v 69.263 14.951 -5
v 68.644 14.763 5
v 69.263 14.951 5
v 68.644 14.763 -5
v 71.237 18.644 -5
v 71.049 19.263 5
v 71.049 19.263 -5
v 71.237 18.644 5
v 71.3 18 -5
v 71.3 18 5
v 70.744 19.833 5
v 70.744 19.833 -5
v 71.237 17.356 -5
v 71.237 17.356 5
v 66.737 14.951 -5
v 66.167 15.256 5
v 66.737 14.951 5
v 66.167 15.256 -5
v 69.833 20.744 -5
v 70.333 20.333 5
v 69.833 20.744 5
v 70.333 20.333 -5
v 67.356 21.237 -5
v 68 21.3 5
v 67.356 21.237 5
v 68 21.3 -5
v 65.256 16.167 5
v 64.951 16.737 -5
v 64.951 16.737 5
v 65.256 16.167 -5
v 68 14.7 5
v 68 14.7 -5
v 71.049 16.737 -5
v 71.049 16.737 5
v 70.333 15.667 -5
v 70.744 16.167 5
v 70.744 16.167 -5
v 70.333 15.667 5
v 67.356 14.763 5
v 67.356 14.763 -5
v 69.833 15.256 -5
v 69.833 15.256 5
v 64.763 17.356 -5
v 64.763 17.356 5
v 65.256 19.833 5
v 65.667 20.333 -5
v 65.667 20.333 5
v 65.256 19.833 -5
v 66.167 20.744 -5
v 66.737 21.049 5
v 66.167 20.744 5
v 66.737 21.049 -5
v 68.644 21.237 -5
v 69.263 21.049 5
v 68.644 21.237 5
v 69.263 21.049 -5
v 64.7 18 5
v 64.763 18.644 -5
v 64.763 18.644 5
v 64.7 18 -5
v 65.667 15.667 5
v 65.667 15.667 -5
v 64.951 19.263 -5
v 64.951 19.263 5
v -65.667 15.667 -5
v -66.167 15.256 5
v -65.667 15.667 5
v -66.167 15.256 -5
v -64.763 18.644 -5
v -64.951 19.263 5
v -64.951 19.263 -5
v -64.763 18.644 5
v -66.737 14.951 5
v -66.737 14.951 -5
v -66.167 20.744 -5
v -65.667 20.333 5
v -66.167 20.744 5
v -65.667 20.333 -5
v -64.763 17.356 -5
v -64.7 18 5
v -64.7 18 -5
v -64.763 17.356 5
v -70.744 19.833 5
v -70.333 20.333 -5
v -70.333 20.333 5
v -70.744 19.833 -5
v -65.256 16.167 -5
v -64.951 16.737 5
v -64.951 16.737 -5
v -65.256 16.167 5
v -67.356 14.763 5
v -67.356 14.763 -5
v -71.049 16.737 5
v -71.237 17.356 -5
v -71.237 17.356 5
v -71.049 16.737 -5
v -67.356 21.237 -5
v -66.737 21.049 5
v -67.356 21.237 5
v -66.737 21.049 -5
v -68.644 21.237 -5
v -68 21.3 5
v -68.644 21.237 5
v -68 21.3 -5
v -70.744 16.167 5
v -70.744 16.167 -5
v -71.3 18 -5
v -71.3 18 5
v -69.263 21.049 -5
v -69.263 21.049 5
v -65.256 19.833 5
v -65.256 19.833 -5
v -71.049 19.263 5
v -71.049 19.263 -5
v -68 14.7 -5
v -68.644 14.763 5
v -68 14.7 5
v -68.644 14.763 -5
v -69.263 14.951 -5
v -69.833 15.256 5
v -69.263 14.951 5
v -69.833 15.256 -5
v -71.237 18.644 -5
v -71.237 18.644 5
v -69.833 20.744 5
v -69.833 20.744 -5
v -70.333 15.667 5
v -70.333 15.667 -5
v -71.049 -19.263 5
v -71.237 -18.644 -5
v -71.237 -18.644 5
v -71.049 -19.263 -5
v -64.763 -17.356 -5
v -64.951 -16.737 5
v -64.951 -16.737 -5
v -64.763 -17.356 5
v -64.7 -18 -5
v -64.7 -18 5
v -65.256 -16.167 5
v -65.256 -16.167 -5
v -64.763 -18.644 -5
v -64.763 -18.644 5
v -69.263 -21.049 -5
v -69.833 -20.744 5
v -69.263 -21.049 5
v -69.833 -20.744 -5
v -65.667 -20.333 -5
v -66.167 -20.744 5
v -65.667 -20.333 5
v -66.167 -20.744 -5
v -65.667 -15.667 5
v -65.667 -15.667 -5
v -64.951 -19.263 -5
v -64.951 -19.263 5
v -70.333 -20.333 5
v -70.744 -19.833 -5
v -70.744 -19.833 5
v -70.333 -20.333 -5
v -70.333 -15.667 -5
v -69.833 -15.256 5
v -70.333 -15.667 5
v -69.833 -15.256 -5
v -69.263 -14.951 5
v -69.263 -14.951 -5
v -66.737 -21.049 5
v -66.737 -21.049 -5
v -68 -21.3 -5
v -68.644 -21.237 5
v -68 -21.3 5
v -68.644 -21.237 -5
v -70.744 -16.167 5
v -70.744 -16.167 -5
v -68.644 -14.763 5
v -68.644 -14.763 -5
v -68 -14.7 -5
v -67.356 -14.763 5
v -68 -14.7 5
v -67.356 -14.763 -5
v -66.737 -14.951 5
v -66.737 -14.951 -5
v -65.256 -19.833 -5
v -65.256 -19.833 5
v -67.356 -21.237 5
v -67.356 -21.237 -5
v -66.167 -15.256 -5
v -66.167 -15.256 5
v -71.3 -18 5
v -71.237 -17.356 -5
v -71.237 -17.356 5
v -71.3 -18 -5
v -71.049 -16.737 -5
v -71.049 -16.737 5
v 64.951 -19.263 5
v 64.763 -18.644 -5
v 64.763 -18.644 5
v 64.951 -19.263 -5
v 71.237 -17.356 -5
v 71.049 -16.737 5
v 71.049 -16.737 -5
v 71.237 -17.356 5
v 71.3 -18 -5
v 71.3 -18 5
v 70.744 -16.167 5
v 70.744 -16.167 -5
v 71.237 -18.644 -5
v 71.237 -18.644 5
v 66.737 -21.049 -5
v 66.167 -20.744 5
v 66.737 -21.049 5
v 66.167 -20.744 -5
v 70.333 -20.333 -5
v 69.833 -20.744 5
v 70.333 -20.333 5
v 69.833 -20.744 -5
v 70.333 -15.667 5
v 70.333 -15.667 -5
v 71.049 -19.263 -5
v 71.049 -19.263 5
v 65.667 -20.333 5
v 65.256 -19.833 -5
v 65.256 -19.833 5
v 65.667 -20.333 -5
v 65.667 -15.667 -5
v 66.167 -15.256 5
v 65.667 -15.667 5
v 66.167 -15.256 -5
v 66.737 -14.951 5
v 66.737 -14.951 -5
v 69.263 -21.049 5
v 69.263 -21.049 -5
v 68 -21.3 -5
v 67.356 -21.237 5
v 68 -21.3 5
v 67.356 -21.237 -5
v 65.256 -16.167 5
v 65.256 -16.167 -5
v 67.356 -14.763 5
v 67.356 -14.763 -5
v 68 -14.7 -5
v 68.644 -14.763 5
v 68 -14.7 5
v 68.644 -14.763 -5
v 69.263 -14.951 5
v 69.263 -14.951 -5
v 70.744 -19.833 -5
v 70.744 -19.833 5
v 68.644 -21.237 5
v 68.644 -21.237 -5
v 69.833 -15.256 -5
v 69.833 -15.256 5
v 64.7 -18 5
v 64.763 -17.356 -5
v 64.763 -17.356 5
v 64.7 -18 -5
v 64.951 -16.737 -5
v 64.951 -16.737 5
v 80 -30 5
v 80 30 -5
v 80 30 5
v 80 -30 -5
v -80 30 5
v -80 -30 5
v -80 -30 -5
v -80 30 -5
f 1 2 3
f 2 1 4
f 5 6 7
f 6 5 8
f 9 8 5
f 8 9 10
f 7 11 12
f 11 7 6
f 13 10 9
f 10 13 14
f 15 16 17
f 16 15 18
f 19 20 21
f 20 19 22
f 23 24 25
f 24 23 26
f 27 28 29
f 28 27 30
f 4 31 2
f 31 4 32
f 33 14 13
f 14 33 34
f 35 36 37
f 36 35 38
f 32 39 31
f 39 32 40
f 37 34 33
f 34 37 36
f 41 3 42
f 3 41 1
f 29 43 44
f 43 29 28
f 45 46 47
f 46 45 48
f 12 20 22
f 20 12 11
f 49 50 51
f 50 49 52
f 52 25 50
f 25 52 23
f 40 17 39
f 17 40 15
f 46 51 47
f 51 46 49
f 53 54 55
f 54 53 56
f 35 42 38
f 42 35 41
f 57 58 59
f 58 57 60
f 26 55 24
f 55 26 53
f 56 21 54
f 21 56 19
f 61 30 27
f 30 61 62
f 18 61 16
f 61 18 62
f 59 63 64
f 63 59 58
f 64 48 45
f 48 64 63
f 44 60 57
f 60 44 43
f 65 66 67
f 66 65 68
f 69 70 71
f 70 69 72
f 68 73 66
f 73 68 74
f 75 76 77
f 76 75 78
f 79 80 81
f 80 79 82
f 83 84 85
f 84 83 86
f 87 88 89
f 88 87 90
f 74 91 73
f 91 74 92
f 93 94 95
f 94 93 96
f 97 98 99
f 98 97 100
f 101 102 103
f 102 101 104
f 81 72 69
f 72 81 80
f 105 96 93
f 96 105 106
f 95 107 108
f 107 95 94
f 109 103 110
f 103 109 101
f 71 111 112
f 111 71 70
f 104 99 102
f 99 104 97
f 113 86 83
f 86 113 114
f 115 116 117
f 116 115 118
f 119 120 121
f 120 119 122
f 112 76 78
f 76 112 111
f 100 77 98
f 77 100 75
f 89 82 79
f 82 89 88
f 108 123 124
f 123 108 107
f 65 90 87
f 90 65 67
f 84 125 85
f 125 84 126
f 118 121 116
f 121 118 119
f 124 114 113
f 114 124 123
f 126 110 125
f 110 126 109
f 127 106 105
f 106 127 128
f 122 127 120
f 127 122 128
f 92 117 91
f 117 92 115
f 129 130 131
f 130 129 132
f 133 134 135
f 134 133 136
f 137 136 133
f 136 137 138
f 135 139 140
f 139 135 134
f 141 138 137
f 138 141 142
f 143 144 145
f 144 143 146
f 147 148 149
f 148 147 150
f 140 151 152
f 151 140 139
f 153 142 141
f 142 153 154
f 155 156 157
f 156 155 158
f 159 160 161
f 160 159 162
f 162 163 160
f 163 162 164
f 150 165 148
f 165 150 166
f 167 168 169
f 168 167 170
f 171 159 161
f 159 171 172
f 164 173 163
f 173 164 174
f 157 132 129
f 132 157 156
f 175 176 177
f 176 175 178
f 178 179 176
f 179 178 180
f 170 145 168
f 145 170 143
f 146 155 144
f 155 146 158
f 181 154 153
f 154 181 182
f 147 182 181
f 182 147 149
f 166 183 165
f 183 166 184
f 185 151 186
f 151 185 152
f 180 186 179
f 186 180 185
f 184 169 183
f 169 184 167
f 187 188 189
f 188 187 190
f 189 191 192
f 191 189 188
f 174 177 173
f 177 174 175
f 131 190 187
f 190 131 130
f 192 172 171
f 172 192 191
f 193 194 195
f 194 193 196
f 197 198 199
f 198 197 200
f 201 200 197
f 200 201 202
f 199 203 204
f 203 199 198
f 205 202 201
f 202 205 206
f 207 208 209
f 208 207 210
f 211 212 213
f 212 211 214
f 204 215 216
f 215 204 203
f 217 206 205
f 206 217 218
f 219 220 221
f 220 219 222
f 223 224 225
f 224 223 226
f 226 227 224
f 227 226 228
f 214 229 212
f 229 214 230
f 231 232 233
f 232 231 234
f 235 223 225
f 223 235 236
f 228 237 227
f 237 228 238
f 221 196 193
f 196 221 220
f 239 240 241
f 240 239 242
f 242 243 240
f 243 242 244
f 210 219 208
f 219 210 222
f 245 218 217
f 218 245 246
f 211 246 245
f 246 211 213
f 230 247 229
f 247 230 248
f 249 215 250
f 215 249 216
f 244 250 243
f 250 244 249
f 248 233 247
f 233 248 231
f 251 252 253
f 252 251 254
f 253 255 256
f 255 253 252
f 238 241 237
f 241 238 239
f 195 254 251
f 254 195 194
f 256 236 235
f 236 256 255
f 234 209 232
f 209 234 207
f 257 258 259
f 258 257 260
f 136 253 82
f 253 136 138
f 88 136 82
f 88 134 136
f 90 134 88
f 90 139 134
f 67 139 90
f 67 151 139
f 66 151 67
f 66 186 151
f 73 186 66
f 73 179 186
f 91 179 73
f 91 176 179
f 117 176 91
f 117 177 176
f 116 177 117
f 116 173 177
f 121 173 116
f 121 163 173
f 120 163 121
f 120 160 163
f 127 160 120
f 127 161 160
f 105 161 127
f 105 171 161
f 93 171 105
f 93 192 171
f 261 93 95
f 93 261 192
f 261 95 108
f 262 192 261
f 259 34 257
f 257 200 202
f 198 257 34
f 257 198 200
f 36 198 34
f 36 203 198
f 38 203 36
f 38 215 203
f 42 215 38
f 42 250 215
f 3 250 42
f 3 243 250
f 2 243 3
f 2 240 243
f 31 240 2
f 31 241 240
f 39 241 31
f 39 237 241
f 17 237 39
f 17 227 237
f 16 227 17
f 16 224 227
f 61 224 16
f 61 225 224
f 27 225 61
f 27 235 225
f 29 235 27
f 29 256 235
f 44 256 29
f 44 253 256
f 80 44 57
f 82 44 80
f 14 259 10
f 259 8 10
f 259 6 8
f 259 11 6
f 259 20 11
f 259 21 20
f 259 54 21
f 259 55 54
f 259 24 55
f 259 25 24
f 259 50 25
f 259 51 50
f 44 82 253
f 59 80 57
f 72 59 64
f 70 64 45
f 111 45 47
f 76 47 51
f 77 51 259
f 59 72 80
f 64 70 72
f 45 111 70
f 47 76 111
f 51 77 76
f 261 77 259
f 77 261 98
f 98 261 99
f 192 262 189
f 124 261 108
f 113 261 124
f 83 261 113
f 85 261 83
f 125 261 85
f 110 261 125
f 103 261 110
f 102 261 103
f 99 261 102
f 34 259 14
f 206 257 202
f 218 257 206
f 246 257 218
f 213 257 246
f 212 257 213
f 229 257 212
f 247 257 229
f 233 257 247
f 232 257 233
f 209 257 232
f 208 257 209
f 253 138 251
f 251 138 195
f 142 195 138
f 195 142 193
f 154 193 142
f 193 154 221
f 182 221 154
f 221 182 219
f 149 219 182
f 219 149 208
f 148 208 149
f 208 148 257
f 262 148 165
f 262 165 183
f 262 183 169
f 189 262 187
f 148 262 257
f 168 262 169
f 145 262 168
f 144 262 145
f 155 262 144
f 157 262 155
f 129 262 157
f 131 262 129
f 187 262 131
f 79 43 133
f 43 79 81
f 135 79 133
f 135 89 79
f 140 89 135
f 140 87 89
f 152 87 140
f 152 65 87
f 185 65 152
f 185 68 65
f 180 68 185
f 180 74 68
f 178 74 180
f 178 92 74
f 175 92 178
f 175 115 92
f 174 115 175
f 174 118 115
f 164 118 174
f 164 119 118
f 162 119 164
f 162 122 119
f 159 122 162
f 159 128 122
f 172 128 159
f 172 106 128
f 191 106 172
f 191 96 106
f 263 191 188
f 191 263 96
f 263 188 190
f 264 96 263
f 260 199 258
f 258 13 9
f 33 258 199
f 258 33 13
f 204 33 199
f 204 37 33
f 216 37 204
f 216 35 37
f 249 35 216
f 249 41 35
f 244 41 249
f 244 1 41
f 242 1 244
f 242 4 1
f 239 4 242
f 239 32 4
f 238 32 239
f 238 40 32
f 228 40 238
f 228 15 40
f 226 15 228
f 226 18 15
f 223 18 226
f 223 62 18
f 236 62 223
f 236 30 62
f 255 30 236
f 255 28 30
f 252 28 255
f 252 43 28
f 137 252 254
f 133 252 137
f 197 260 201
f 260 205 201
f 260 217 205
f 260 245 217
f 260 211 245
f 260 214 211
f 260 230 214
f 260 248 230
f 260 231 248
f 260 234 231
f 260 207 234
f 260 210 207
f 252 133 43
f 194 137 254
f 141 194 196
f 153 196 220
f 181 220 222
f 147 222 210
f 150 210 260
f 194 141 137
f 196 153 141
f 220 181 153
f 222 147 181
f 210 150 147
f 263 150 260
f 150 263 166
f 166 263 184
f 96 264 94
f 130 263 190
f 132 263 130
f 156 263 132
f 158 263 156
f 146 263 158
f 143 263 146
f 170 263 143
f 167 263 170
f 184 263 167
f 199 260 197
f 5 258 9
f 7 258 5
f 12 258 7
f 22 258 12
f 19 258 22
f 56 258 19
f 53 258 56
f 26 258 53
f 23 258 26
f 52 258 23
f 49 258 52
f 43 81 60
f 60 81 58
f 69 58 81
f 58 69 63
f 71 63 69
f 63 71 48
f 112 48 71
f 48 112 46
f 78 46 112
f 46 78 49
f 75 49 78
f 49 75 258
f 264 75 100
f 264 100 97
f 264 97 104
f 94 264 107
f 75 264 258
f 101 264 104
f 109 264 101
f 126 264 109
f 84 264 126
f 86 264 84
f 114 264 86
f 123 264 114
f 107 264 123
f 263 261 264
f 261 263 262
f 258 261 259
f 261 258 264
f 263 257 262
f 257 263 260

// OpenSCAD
$fn = 32;

// ----------------------------------------------------------------------
// Corner plate 160 x 60 x 10
// 4 holes, centres taken from the edge offset
// ----------------------------------------------------------------------

// --- parameters (mm) ---
plate = [160, 60, 10];  // overall size (x, y, z)
seat_tol = 0.1;         // tolerance at the seating features
free_tol = 0.5;         // general tolerance on the free sizes
holes = 4;              // number of holes the drawing asks for
hole_d = 6.6;           // hole diameter
edge = 12;              // hole centre offset from the plate edge

// --- derived feature positions (mm) ---
corner_x = plate[0] / 2 - edge;  // = 68   corner hole X
corner_y = plate[1] / 2 - edge;  // = 18   corner hole Y
feature_centers = [
  [corner_x, corner_y],
  [-corner_x, corner_y],
  [-corner_x, -corner_y],
  [corner_x, -corner_y]
];   // hole centres the loop below drills

// plate outline, every hole drilled through with the same cutters
difference() {
  cube(plate, center = true);
  for (centre = feature_centers)
    translate([centre[0], centre[1], 0])
      cylinder(d = hole_d, h = plate[2] + 2, center = true);
}
